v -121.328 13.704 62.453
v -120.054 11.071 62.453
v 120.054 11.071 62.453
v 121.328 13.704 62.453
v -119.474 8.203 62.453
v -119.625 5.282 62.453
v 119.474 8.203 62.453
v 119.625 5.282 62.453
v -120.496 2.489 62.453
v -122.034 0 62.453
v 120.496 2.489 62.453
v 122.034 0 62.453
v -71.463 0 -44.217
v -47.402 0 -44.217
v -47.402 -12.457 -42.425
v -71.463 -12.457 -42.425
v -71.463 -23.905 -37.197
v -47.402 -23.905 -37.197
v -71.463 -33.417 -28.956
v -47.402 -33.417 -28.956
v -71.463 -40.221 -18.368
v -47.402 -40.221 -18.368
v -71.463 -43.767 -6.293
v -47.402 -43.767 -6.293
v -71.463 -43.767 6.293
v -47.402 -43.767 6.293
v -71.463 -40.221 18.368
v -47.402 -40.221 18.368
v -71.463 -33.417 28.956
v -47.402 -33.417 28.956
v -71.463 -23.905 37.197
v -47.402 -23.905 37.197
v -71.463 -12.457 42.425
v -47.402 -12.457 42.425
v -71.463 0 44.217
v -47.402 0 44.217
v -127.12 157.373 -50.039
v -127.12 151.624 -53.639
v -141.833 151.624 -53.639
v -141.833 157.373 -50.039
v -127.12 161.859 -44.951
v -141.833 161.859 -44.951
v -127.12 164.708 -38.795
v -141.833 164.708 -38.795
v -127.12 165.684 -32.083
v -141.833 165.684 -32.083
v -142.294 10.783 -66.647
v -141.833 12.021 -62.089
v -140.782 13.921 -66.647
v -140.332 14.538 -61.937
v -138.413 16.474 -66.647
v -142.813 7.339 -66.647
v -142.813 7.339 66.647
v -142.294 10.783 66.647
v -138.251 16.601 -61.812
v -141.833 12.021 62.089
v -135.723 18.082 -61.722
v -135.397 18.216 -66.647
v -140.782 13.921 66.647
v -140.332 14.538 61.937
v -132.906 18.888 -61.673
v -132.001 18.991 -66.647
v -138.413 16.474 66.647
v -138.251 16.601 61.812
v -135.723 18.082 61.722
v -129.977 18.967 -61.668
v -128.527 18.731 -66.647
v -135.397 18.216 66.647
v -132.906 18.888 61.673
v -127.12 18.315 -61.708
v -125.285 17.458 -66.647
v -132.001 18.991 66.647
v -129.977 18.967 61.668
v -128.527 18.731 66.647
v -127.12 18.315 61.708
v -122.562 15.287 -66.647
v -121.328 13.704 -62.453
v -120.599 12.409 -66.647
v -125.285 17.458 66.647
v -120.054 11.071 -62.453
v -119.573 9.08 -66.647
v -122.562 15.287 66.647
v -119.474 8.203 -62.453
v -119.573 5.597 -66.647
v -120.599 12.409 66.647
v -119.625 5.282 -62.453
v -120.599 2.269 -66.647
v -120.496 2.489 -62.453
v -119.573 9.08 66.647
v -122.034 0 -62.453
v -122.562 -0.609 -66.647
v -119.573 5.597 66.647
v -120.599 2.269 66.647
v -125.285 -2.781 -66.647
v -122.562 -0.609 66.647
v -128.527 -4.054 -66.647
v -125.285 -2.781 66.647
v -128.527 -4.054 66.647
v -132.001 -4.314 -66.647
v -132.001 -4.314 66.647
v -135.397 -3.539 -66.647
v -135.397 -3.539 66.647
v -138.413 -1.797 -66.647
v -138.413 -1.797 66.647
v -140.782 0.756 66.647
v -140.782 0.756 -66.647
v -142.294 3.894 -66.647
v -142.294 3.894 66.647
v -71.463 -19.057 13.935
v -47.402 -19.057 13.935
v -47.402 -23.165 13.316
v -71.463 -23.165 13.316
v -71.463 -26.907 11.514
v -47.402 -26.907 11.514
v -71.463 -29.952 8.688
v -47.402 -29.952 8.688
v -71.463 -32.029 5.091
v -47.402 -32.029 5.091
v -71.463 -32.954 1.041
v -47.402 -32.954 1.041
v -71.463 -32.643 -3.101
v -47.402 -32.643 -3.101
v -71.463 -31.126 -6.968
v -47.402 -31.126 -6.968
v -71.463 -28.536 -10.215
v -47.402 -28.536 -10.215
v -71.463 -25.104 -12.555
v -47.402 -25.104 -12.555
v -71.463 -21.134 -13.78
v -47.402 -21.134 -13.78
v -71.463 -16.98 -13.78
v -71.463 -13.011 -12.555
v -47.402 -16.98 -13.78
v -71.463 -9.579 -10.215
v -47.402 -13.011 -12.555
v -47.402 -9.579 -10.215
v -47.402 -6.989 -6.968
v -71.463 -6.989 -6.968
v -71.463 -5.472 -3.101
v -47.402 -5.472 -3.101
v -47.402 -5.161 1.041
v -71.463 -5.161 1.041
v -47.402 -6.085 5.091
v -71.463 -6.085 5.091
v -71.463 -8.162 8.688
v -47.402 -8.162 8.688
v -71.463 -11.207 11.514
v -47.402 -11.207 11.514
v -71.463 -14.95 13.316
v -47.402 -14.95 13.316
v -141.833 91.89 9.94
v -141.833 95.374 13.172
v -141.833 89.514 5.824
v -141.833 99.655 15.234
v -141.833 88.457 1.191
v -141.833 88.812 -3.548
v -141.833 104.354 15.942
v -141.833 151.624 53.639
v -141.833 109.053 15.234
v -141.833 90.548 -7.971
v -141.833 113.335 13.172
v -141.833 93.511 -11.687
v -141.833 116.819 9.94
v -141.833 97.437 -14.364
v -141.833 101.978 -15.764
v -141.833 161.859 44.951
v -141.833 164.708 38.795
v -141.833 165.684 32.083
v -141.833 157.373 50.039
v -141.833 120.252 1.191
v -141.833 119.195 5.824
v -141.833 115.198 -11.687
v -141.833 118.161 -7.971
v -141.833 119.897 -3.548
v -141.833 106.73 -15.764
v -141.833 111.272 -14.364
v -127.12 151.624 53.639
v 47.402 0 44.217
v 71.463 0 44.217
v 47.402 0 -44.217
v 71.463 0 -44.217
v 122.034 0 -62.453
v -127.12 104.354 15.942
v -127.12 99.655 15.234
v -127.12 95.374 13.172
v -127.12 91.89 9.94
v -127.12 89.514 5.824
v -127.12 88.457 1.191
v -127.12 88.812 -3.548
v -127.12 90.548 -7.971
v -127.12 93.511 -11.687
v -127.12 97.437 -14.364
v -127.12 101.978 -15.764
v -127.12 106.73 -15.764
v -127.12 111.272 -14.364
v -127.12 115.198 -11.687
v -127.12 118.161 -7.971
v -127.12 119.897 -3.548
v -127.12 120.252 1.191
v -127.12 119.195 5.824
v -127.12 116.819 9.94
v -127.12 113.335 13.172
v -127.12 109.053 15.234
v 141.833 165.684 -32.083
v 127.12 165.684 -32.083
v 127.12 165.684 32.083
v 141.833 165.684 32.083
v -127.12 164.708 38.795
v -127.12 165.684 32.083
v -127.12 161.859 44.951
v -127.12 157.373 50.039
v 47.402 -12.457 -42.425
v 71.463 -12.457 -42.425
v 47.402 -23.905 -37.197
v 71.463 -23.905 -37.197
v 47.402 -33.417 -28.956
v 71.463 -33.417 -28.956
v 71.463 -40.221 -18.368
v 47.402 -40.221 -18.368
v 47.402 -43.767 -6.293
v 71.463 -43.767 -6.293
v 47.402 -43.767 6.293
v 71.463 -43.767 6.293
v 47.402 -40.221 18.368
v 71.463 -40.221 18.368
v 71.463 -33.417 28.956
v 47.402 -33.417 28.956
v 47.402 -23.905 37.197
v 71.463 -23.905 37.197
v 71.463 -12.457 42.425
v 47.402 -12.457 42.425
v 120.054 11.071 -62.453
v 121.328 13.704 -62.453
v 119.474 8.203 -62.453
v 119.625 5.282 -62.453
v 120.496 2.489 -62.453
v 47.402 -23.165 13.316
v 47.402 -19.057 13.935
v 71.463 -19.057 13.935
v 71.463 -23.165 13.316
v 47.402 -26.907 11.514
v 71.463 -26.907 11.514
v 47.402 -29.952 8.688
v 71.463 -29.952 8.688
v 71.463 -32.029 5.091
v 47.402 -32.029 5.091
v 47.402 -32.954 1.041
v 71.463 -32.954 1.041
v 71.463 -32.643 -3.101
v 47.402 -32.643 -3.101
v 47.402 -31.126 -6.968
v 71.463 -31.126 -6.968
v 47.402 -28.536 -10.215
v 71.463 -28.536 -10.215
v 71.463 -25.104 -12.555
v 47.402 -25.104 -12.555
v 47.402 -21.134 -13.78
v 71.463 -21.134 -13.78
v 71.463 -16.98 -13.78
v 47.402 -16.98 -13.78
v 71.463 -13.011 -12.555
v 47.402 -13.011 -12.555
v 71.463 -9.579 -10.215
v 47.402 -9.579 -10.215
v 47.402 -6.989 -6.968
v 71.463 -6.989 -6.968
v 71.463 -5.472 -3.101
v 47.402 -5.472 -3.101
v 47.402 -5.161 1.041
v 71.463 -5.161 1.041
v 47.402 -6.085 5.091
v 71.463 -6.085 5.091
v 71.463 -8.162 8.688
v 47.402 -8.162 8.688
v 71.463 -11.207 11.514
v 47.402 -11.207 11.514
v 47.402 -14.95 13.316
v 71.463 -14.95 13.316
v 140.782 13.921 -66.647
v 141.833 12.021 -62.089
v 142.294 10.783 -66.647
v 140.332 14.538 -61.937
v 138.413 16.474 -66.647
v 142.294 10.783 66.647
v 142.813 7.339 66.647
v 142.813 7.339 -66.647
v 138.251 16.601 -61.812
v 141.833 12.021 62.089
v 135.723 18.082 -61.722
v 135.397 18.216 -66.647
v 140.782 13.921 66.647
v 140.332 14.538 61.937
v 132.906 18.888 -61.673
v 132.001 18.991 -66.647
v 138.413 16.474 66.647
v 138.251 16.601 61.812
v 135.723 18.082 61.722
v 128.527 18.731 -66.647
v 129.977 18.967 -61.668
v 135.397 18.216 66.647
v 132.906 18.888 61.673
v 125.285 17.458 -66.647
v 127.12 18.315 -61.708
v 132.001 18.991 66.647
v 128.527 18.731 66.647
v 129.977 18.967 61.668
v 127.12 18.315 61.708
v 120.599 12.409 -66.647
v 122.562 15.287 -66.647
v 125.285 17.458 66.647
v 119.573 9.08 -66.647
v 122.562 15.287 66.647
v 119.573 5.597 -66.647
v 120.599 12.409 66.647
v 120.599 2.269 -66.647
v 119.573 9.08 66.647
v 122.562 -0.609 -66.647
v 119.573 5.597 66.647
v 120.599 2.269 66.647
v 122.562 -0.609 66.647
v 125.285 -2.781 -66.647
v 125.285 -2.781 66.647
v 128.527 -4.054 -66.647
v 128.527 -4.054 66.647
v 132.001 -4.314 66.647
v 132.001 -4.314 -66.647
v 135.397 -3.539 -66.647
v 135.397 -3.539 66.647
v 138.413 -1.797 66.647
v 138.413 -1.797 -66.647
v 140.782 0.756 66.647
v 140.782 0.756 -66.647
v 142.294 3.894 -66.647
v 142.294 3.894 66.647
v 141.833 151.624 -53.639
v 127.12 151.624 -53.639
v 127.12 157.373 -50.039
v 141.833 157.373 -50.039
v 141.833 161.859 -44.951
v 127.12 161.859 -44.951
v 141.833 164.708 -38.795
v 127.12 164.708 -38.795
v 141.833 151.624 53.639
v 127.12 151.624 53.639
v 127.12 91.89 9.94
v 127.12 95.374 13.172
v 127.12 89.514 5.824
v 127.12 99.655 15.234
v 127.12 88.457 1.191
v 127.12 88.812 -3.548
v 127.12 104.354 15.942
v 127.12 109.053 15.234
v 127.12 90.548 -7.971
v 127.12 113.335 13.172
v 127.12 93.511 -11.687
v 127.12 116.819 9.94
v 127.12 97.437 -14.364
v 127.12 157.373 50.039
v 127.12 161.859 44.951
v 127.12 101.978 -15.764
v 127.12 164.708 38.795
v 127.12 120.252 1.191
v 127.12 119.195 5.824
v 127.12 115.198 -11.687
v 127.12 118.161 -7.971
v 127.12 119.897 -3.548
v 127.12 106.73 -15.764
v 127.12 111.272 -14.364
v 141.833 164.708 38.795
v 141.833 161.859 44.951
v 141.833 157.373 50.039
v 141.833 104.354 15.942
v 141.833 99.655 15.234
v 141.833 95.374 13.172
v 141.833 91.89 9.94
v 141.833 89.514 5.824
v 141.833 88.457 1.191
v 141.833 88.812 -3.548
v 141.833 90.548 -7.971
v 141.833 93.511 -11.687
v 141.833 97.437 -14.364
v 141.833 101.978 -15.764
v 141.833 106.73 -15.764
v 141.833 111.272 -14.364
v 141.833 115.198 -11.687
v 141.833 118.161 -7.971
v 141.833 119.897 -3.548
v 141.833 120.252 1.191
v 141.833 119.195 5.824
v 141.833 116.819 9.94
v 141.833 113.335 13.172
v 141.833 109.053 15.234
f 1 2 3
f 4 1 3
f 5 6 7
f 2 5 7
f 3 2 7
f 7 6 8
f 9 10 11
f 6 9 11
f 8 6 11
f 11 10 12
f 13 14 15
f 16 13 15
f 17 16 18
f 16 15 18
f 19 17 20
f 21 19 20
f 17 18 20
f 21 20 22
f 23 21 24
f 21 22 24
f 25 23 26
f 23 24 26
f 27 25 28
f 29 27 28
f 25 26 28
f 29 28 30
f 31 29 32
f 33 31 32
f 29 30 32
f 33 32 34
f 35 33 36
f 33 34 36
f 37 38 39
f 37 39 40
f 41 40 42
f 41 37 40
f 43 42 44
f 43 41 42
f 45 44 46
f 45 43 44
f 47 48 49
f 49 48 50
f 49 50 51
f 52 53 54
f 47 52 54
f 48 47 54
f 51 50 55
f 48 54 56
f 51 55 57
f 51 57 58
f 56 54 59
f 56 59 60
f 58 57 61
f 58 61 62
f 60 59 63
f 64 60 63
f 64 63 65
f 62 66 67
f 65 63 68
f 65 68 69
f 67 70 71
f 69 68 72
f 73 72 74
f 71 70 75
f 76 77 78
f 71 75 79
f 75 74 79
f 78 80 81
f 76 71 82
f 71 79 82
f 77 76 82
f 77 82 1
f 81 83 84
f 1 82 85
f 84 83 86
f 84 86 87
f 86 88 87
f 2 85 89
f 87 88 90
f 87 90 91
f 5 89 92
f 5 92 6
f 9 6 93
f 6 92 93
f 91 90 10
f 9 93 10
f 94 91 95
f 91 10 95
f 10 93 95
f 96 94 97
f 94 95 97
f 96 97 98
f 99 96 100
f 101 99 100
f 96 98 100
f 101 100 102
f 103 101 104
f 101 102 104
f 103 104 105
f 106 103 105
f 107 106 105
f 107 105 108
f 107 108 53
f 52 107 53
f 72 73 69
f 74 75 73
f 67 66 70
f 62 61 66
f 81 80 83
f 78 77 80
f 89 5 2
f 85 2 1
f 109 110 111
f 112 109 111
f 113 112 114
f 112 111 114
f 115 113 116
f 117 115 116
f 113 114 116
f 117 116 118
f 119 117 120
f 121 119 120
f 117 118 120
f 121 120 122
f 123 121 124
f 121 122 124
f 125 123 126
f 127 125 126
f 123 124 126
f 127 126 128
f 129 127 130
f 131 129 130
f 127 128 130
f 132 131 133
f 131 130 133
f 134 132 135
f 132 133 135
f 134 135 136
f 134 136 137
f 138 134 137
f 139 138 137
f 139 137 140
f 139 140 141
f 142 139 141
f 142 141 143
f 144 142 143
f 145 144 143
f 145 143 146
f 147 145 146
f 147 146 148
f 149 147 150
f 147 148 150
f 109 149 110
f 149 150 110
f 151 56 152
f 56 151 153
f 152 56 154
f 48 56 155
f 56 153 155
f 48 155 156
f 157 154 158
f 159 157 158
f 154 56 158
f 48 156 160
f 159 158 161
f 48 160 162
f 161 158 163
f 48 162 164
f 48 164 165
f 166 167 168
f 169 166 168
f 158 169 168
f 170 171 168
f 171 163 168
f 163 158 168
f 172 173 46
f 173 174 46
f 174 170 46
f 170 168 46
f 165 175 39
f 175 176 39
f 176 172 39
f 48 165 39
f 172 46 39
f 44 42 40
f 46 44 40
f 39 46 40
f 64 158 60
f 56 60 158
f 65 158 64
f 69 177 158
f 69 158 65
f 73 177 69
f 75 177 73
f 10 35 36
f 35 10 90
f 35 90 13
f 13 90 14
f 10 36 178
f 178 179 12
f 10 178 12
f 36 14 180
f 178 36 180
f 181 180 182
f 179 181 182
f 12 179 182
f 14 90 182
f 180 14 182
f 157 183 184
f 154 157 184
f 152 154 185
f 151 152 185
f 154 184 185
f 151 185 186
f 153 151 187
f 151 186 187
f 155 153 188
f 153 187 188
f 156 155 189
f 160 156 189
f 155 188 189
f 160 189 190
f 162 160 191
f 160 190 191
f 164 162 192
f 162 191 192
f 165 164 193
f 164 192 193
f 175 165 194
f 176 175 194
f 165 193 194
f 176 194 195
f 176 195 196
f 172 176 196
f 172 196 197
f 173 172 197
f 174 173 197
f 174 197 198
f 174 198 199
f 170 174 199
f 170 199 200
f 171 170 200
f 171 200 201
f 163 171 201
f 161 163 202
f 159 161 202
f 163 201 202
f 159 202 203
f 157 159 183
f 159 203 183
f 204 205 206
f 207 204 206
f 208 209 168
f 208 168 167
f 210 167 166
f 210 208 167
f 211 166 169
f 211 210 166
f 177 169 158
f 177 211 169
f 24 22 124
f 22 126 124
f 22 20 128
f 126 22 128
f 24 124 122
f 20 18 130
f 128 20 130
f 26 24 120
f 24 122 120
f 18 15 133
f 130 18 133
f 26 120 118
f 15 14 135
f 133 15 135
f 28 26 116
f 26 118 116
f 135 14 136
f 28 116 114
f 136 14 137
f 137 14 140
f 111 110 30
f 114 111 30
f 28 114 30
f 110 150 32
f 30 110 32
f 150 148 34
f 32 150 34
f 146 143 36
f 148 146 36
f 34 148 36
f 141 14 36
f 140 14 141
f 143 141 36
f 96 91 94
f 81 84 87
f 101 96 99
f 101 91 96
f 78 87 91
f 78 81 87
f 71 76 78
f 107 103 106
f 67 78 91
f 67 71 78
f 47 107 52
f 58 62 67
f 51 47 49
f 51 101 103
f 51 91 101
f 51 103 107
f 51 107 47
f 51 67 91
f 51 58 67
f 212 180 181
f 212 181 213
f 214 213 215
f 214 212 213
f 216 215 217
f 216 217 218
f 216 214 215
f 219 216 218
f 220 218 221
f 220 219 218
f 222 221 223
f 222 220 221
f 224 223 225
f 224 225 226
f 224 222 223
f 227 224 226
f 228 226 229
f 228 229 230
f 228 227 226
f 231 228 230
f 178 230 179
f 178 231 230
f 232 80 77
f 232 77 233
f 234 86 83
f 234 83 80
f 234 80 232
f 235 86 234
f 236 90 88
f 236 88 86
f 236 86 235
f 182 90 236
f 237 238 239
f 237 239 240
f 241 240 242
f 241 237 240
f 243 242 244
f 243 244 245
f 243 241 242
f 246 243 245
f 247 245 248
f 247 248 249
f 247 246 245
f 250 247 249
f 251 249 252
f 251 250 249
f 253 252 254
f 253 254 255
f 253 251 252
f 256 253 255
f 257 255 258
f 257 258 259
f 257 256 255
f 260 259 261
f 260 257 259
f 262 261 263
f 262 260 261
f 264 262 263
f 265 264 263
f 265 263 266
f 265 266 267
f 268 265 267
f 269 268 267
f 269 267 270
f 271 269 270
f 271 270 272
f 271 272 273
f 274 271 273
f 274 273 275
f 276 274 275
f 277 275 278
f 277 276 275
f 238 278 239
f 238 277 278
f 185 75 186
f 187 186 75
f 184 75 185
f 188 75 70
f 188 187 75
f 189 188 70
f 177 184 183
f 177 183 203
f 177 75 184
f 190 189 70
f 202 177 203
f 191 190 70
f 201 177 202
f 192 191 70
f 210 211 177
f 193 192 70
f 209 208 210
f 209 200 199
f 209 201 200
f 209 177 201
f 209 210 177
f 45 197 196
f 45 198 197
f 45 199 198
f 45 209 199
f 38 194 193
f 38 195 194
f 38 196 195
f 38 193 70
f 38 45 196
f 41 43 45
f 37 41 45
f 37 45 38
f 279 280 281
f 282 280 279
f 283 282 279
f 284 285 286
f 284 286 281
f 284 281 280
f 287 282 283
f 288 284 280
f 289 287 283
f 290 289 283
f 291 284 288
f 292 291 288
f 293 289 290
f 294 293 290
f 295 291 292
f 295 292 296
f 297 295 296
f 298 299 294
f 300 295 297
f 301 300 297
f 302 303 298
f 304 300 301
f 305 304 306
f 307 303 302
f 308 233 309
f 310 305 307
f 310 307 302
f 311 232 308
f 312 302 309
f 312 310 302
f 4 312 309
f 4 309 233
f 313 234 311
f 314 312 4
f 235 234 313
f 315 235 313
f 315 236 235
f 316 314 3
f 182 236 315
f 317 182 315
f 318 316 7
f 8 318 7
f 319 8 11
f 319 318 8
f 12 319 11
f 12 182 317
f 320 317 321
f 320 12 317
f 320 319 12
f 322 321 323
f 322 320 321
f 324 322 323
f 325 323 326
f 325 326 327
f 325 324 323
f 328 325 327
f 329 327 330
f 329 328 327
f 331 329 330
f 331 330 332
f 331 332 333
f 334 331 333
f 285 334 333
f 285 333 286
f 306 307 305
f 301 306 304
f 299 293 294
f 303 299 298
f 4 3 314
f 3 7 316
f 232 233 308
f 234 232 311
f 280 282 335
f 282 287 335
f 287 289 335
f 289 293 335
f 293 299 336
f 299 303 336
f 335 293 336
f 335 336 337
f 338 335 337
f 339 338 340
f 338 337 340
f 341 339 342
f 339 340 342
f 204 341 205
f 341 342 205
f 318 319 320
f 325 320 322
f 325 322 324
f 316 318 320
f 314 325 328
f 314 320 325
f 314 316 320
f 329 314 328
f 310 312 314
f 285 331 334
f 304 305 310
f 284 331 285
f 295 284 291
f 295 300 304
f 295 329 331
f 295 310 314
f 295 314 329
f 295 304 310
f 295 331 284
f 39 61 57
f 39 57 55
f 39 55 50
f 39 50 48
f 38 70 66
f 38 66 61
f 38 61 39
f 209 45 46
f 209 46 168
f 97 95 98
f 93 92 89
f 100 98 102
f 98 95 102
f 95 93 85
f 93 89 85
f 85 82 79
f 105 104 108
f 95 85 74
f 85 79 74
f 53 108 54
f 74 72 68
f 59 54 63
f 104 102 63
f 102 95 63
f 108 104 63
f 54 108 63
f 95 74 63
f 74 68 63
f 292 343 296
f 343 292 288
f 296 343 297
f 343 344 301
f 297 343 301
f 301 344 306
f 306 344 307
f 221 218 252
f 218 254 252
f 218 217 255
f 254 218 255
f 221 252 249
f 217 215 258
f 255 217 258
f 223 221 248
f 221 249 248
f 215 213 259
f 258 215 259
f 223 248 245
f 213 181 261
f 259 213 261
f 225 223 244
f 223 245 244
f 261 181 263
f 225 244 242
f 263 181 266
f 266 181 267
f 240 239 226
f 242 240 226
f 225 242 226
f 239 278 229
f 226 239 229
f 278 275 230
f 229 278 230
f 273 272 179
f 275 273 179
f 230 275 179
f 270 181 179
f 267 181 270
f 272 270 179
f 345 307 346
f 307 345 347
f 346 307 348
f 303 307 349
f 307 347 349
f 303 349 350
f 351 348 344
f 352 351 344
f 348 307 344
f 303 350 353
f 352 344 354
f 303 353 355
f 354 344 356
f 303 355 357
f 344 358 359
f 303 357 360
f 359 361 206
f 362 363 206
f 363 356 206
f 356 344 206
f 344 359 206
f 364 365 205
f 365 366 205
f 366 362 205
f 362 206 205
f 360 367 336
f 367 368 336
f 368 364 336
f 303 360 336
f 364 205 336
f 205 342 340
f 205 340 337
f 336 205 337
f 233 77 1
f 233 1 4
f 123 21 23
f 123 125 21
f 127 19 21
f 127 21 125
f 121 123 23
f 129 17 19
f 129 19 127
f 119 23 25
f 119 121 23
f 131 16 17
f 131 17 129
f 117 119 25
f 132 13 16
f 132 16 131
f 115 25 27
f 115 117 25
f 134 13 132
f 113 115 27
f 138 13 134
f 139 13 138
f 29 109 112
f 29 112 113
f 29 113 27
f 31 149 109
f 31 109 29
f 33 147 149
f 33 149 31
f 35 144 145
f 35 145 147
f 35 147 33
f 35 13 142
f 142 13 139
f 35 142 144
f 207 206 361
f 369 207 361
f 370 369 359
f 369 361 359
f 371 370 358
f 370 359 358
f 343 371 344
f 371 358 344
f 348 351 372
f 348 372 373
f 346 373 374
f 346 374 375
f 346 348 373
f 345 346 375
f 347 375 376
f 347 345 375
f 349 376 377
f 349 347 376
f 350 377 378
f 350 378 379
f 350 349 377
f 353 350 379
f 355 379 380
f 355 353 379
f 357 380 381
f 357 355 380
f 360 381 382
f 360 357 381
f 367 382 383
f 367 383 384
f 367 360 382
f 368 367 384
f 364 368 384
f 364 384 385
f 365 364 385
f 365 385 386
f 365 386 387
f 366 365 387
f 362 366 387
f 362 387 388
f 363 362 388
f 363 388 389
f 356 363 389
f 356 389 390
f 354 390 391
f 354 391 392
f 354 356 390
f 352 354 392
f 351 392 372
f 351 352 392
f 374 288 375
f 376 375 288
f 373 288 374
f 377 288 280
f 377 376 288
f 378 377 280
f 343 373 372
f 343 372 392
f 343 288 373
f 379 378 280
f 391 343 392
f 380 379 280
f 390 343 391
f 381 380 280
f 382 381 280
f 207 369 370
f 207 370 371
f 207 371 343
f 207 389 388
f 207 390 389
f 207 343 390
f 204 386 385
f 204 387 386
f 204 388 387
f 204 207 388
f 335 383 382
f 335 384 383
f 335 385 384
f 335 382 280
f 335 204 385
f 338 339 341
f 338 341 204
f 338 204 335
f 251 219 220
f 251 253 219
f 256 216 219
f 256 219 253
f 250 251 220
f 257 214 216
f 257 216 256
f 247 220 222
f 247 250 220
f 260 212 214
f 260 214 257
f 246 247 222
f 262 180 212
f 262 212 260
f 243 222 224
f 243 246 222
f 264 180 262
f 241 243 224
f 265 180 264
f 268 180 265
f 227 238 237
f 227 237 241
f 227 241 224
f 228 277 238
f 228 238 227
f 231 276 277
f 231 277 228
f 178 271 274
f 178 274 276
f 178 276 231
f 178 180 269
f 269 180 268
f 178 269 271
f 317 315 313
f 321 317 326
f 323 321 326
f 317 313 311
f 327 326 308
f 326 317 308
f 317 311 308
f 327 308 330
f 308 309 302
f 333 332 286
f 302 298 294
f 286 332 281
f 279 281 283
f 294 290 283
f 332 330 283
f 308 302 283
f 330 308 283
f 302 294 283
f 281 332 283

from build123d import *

# Parameters (mm, degrees)
SKETCH1_W           = 253.301246
SKETCH1_H           = 124.905262
BOSS_EXTRUDE1_DEPTH = 13.704316
SKETCH3_R           = 11.68527
BOSS_EXTRUDE6_DEPTH = 133.294628
SKETCH4_R           = 13.935202
BOSS_EXTRUDE7_DEPTH = 24.061166
SKETCH2_R           = 15.942437
BOSS_EXTRUDE8_DEPTH = 14.713204


with BuildPart() as part:
    # Sketch1 → Boss-Extrude1 (new body)
    with BuildSketch(Plane(origin=(0, 0, 0), x_dir=(1, 0, 0), z_dir=(0, 1, 0))):
        Rectangle(SKETCH1_W, SKETCH1_H)
    extrude(amount=BOSS_EXTRUDE1_DEPTH)

    # Sketch3 → Boss-Extrude6 (add)
    with BuildSketch(Plane.XY.offset(66.647314)):
        with Locations((131.1274492, 7.338568)):
            Circle(SKETCH3_R)
    boss_extrude6 = extrude(amount=-BOSS_EXTRUDE6_DEPTH)

    # Sketch4 → Boss-Extrude7 (add)
    with BuildSketch(Plane(origin=(47.4016832, 0, 0), x_dir=(0, 0, -1), z_dir=(1, 0, 0))):
        with BuildLine():
            Line((-44.216574, 0), (44.216574, 0))
            ThreePointArc((44.216574, 0), (0, -44.216574), (-44.216574, 0))
        make_face()
        with Locations(Location((0, -19.057366, 0), (0, 0, 180))):
            Circle(SKETCH4_R, mode=Mode.SUBTRACT)
    boss_extrude7 = extrude(amount=BOSS_EXTRUDE7_DEPTH)

    # Sketch2 → Boss-Extrude8 (add)
    with BuildSketch(Plane(origin=(127.120142, 0, 0), x_dir=(0, 0, -1), z_dir=(1, 0, 0))):
        with BuildLine():
            Line((-62.49035, 5.388102), (62.49035, 5.388102))
            Line((62.49035, 5.388102), (53.638831, 151.624284))
            ThreePointArc((53.638831, 151.624284), (44.950710882, 161.858546774), (32.082613, 165.6842))
            Line((32.082613, 165.6842), (-32.082613, 165.6842))
            ThreePointArc((-32.082613, 165.6842), (-44.950710882, 161.858546774), (-53.638831, 151.624284))
            Line((-53.638831, 151.624284), (-62.49035, 5.388102))
        make_face()
        with Locations(Location((0, 104.354376, 0), (0, 0, 180))):
            Circle(SKETCH2_R, mode=Mode.SUBTRACT)
    boss_extrude8 = extrude(amount=BOSS_EXTRUDE8_DEPTH)

    # Mirror5: Boss-Extrude6, Boss-Extrude7, Boss-Extrude8 across plane
    add(boss_extrude6.mirror(Plane(origin=(0, 0, 0), x_dir=(0, 0, 1), z_dir=(1, 0, 0))))
    add(boss_extrude7.mirror(Plane(origin=(0, 0, 0), x_dir=(0, 0, 1), z_dir=(1, 0, 0))))
    add(boss_extrude8.mirror(Plane(origin=(0, 0, 0), x_dir=(0, 0, 1), z_dir=(1, 0, 0))))


solid = part.part
